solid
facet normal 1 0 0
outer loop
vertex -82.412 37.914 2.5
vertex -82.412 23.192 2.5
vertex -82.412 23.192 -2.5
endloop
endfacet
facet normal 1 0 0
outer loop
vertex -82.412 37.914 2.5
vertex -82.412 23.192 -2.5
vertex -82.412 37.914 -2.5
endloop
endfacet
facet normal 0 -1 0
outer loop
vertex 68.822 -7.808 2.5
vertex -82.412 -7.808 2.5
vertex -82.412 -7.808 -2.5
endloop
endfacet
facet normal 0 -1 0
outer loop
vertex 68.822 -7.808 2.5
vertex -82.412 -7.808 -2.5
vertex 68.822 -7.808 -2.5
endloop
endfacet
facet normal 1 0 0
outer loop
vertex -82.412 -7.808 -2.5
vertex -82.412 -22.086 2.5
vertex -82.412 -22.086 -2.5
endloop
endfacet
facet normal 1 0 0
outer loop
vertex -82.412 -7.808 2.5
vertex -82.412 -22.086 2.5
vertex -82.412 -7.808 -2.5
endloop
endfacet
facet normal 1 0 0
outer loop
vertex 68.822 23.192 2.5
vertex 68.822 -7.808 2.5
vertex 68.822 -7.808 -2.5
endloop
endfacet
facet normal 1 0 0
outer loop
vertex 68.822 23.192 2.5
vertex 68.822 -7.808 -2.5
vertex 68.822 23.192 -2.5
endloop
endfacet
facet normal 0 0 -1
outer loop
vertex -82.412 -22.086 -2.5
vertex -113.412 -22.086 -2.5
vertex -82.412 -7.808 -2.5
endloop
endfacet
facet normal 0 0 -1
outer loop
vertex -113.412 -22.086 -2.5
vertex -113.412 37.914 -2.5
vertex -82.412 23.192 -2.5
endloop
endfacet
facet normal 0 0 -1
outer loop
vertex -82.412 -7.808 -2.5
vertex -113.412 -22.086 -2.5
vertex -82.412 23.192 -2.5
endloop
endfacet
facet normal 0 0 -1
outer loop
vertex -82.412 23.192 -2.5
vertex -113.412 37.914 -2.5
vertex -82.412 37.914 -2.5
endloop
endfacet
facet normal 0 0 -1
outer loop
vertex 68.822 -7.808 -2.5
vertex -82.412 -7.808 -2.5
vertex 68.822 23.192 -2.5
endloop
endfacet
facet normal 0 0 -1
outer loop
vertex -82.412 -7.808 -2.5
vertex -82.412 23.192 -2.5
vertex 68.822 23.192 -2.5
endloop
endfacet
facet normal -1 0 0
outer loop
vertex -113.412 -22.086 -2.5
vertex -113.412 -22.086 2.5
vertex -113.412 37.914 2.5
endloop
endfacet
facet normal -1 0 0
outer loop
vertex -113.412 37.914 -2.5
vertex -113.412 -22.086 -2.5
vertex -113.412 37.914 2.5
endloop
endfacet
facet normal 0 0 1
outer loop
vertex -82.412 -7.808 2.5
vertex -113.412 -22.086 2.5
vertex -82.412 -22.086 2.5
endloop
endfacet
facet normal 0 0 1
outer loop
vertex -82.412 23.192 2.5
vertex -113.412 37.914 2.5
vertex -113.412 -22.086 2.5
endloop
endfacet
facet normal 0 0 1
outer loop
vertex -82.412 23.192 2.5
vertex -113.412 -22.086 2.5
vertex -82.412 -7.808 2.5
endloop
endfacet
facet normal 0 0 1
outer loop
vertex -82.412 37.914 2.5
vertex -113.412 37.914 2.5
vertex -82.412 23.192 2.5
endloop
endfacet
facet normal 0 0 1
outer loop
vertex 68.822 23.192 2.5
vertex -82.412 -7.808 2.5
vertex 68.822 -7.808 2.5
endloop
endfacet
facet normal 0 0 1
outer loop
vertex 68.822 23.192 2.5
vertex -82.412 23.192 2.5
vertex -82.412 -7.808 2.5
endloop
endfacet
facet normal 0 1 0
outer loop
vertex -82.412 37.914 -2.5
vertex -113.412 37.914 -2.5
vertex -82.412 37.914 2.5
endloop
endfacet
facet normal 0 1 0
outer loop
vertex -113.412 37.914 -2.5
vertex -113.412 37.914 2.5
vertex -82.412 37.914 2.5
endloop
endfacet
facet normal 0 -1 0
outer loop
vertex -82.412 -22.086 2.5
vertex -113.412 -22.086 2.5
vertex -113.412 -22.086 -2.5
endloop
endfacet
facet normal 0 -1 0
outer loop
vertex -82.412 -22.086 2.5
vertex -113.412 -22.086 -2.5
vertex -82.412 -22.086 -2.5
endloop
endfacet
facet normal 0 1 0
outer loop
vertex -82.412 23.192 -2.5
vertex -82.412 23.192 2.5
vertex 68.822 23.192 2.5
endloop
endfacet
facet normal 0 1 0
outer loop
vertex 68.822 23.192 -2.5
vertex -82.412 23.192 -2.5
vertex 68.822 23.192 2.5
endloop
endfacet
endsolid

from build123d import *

# Parameters (mm, degrees)
F0_W     = 180
F0_H     = 31
F1_DEPTH = 2.5
F2_W     = 31
F2_H     = 60
F3_DEPTH = 2.5


with BuildPart() as f1:
    # F0 (on Top) → F1 (new body, symmetric)
    with BuildSketch(Plane.XY):
        with Locations((-21.178086, 7.692472)):
            Rectangle(F0_W, F0_H)
    extrude(amount=F1_DEPTH, both=True)

    # F2 (on Top) → F3 (join, symmetric)
    with BuildSketch(Plane.XY):
        with Locations((-97.912037, 7.913927)):
            Rectangle(F2_W, F2_H)
    extrude(amount=F3_DEPTH, both=True)


solid = f1.part
